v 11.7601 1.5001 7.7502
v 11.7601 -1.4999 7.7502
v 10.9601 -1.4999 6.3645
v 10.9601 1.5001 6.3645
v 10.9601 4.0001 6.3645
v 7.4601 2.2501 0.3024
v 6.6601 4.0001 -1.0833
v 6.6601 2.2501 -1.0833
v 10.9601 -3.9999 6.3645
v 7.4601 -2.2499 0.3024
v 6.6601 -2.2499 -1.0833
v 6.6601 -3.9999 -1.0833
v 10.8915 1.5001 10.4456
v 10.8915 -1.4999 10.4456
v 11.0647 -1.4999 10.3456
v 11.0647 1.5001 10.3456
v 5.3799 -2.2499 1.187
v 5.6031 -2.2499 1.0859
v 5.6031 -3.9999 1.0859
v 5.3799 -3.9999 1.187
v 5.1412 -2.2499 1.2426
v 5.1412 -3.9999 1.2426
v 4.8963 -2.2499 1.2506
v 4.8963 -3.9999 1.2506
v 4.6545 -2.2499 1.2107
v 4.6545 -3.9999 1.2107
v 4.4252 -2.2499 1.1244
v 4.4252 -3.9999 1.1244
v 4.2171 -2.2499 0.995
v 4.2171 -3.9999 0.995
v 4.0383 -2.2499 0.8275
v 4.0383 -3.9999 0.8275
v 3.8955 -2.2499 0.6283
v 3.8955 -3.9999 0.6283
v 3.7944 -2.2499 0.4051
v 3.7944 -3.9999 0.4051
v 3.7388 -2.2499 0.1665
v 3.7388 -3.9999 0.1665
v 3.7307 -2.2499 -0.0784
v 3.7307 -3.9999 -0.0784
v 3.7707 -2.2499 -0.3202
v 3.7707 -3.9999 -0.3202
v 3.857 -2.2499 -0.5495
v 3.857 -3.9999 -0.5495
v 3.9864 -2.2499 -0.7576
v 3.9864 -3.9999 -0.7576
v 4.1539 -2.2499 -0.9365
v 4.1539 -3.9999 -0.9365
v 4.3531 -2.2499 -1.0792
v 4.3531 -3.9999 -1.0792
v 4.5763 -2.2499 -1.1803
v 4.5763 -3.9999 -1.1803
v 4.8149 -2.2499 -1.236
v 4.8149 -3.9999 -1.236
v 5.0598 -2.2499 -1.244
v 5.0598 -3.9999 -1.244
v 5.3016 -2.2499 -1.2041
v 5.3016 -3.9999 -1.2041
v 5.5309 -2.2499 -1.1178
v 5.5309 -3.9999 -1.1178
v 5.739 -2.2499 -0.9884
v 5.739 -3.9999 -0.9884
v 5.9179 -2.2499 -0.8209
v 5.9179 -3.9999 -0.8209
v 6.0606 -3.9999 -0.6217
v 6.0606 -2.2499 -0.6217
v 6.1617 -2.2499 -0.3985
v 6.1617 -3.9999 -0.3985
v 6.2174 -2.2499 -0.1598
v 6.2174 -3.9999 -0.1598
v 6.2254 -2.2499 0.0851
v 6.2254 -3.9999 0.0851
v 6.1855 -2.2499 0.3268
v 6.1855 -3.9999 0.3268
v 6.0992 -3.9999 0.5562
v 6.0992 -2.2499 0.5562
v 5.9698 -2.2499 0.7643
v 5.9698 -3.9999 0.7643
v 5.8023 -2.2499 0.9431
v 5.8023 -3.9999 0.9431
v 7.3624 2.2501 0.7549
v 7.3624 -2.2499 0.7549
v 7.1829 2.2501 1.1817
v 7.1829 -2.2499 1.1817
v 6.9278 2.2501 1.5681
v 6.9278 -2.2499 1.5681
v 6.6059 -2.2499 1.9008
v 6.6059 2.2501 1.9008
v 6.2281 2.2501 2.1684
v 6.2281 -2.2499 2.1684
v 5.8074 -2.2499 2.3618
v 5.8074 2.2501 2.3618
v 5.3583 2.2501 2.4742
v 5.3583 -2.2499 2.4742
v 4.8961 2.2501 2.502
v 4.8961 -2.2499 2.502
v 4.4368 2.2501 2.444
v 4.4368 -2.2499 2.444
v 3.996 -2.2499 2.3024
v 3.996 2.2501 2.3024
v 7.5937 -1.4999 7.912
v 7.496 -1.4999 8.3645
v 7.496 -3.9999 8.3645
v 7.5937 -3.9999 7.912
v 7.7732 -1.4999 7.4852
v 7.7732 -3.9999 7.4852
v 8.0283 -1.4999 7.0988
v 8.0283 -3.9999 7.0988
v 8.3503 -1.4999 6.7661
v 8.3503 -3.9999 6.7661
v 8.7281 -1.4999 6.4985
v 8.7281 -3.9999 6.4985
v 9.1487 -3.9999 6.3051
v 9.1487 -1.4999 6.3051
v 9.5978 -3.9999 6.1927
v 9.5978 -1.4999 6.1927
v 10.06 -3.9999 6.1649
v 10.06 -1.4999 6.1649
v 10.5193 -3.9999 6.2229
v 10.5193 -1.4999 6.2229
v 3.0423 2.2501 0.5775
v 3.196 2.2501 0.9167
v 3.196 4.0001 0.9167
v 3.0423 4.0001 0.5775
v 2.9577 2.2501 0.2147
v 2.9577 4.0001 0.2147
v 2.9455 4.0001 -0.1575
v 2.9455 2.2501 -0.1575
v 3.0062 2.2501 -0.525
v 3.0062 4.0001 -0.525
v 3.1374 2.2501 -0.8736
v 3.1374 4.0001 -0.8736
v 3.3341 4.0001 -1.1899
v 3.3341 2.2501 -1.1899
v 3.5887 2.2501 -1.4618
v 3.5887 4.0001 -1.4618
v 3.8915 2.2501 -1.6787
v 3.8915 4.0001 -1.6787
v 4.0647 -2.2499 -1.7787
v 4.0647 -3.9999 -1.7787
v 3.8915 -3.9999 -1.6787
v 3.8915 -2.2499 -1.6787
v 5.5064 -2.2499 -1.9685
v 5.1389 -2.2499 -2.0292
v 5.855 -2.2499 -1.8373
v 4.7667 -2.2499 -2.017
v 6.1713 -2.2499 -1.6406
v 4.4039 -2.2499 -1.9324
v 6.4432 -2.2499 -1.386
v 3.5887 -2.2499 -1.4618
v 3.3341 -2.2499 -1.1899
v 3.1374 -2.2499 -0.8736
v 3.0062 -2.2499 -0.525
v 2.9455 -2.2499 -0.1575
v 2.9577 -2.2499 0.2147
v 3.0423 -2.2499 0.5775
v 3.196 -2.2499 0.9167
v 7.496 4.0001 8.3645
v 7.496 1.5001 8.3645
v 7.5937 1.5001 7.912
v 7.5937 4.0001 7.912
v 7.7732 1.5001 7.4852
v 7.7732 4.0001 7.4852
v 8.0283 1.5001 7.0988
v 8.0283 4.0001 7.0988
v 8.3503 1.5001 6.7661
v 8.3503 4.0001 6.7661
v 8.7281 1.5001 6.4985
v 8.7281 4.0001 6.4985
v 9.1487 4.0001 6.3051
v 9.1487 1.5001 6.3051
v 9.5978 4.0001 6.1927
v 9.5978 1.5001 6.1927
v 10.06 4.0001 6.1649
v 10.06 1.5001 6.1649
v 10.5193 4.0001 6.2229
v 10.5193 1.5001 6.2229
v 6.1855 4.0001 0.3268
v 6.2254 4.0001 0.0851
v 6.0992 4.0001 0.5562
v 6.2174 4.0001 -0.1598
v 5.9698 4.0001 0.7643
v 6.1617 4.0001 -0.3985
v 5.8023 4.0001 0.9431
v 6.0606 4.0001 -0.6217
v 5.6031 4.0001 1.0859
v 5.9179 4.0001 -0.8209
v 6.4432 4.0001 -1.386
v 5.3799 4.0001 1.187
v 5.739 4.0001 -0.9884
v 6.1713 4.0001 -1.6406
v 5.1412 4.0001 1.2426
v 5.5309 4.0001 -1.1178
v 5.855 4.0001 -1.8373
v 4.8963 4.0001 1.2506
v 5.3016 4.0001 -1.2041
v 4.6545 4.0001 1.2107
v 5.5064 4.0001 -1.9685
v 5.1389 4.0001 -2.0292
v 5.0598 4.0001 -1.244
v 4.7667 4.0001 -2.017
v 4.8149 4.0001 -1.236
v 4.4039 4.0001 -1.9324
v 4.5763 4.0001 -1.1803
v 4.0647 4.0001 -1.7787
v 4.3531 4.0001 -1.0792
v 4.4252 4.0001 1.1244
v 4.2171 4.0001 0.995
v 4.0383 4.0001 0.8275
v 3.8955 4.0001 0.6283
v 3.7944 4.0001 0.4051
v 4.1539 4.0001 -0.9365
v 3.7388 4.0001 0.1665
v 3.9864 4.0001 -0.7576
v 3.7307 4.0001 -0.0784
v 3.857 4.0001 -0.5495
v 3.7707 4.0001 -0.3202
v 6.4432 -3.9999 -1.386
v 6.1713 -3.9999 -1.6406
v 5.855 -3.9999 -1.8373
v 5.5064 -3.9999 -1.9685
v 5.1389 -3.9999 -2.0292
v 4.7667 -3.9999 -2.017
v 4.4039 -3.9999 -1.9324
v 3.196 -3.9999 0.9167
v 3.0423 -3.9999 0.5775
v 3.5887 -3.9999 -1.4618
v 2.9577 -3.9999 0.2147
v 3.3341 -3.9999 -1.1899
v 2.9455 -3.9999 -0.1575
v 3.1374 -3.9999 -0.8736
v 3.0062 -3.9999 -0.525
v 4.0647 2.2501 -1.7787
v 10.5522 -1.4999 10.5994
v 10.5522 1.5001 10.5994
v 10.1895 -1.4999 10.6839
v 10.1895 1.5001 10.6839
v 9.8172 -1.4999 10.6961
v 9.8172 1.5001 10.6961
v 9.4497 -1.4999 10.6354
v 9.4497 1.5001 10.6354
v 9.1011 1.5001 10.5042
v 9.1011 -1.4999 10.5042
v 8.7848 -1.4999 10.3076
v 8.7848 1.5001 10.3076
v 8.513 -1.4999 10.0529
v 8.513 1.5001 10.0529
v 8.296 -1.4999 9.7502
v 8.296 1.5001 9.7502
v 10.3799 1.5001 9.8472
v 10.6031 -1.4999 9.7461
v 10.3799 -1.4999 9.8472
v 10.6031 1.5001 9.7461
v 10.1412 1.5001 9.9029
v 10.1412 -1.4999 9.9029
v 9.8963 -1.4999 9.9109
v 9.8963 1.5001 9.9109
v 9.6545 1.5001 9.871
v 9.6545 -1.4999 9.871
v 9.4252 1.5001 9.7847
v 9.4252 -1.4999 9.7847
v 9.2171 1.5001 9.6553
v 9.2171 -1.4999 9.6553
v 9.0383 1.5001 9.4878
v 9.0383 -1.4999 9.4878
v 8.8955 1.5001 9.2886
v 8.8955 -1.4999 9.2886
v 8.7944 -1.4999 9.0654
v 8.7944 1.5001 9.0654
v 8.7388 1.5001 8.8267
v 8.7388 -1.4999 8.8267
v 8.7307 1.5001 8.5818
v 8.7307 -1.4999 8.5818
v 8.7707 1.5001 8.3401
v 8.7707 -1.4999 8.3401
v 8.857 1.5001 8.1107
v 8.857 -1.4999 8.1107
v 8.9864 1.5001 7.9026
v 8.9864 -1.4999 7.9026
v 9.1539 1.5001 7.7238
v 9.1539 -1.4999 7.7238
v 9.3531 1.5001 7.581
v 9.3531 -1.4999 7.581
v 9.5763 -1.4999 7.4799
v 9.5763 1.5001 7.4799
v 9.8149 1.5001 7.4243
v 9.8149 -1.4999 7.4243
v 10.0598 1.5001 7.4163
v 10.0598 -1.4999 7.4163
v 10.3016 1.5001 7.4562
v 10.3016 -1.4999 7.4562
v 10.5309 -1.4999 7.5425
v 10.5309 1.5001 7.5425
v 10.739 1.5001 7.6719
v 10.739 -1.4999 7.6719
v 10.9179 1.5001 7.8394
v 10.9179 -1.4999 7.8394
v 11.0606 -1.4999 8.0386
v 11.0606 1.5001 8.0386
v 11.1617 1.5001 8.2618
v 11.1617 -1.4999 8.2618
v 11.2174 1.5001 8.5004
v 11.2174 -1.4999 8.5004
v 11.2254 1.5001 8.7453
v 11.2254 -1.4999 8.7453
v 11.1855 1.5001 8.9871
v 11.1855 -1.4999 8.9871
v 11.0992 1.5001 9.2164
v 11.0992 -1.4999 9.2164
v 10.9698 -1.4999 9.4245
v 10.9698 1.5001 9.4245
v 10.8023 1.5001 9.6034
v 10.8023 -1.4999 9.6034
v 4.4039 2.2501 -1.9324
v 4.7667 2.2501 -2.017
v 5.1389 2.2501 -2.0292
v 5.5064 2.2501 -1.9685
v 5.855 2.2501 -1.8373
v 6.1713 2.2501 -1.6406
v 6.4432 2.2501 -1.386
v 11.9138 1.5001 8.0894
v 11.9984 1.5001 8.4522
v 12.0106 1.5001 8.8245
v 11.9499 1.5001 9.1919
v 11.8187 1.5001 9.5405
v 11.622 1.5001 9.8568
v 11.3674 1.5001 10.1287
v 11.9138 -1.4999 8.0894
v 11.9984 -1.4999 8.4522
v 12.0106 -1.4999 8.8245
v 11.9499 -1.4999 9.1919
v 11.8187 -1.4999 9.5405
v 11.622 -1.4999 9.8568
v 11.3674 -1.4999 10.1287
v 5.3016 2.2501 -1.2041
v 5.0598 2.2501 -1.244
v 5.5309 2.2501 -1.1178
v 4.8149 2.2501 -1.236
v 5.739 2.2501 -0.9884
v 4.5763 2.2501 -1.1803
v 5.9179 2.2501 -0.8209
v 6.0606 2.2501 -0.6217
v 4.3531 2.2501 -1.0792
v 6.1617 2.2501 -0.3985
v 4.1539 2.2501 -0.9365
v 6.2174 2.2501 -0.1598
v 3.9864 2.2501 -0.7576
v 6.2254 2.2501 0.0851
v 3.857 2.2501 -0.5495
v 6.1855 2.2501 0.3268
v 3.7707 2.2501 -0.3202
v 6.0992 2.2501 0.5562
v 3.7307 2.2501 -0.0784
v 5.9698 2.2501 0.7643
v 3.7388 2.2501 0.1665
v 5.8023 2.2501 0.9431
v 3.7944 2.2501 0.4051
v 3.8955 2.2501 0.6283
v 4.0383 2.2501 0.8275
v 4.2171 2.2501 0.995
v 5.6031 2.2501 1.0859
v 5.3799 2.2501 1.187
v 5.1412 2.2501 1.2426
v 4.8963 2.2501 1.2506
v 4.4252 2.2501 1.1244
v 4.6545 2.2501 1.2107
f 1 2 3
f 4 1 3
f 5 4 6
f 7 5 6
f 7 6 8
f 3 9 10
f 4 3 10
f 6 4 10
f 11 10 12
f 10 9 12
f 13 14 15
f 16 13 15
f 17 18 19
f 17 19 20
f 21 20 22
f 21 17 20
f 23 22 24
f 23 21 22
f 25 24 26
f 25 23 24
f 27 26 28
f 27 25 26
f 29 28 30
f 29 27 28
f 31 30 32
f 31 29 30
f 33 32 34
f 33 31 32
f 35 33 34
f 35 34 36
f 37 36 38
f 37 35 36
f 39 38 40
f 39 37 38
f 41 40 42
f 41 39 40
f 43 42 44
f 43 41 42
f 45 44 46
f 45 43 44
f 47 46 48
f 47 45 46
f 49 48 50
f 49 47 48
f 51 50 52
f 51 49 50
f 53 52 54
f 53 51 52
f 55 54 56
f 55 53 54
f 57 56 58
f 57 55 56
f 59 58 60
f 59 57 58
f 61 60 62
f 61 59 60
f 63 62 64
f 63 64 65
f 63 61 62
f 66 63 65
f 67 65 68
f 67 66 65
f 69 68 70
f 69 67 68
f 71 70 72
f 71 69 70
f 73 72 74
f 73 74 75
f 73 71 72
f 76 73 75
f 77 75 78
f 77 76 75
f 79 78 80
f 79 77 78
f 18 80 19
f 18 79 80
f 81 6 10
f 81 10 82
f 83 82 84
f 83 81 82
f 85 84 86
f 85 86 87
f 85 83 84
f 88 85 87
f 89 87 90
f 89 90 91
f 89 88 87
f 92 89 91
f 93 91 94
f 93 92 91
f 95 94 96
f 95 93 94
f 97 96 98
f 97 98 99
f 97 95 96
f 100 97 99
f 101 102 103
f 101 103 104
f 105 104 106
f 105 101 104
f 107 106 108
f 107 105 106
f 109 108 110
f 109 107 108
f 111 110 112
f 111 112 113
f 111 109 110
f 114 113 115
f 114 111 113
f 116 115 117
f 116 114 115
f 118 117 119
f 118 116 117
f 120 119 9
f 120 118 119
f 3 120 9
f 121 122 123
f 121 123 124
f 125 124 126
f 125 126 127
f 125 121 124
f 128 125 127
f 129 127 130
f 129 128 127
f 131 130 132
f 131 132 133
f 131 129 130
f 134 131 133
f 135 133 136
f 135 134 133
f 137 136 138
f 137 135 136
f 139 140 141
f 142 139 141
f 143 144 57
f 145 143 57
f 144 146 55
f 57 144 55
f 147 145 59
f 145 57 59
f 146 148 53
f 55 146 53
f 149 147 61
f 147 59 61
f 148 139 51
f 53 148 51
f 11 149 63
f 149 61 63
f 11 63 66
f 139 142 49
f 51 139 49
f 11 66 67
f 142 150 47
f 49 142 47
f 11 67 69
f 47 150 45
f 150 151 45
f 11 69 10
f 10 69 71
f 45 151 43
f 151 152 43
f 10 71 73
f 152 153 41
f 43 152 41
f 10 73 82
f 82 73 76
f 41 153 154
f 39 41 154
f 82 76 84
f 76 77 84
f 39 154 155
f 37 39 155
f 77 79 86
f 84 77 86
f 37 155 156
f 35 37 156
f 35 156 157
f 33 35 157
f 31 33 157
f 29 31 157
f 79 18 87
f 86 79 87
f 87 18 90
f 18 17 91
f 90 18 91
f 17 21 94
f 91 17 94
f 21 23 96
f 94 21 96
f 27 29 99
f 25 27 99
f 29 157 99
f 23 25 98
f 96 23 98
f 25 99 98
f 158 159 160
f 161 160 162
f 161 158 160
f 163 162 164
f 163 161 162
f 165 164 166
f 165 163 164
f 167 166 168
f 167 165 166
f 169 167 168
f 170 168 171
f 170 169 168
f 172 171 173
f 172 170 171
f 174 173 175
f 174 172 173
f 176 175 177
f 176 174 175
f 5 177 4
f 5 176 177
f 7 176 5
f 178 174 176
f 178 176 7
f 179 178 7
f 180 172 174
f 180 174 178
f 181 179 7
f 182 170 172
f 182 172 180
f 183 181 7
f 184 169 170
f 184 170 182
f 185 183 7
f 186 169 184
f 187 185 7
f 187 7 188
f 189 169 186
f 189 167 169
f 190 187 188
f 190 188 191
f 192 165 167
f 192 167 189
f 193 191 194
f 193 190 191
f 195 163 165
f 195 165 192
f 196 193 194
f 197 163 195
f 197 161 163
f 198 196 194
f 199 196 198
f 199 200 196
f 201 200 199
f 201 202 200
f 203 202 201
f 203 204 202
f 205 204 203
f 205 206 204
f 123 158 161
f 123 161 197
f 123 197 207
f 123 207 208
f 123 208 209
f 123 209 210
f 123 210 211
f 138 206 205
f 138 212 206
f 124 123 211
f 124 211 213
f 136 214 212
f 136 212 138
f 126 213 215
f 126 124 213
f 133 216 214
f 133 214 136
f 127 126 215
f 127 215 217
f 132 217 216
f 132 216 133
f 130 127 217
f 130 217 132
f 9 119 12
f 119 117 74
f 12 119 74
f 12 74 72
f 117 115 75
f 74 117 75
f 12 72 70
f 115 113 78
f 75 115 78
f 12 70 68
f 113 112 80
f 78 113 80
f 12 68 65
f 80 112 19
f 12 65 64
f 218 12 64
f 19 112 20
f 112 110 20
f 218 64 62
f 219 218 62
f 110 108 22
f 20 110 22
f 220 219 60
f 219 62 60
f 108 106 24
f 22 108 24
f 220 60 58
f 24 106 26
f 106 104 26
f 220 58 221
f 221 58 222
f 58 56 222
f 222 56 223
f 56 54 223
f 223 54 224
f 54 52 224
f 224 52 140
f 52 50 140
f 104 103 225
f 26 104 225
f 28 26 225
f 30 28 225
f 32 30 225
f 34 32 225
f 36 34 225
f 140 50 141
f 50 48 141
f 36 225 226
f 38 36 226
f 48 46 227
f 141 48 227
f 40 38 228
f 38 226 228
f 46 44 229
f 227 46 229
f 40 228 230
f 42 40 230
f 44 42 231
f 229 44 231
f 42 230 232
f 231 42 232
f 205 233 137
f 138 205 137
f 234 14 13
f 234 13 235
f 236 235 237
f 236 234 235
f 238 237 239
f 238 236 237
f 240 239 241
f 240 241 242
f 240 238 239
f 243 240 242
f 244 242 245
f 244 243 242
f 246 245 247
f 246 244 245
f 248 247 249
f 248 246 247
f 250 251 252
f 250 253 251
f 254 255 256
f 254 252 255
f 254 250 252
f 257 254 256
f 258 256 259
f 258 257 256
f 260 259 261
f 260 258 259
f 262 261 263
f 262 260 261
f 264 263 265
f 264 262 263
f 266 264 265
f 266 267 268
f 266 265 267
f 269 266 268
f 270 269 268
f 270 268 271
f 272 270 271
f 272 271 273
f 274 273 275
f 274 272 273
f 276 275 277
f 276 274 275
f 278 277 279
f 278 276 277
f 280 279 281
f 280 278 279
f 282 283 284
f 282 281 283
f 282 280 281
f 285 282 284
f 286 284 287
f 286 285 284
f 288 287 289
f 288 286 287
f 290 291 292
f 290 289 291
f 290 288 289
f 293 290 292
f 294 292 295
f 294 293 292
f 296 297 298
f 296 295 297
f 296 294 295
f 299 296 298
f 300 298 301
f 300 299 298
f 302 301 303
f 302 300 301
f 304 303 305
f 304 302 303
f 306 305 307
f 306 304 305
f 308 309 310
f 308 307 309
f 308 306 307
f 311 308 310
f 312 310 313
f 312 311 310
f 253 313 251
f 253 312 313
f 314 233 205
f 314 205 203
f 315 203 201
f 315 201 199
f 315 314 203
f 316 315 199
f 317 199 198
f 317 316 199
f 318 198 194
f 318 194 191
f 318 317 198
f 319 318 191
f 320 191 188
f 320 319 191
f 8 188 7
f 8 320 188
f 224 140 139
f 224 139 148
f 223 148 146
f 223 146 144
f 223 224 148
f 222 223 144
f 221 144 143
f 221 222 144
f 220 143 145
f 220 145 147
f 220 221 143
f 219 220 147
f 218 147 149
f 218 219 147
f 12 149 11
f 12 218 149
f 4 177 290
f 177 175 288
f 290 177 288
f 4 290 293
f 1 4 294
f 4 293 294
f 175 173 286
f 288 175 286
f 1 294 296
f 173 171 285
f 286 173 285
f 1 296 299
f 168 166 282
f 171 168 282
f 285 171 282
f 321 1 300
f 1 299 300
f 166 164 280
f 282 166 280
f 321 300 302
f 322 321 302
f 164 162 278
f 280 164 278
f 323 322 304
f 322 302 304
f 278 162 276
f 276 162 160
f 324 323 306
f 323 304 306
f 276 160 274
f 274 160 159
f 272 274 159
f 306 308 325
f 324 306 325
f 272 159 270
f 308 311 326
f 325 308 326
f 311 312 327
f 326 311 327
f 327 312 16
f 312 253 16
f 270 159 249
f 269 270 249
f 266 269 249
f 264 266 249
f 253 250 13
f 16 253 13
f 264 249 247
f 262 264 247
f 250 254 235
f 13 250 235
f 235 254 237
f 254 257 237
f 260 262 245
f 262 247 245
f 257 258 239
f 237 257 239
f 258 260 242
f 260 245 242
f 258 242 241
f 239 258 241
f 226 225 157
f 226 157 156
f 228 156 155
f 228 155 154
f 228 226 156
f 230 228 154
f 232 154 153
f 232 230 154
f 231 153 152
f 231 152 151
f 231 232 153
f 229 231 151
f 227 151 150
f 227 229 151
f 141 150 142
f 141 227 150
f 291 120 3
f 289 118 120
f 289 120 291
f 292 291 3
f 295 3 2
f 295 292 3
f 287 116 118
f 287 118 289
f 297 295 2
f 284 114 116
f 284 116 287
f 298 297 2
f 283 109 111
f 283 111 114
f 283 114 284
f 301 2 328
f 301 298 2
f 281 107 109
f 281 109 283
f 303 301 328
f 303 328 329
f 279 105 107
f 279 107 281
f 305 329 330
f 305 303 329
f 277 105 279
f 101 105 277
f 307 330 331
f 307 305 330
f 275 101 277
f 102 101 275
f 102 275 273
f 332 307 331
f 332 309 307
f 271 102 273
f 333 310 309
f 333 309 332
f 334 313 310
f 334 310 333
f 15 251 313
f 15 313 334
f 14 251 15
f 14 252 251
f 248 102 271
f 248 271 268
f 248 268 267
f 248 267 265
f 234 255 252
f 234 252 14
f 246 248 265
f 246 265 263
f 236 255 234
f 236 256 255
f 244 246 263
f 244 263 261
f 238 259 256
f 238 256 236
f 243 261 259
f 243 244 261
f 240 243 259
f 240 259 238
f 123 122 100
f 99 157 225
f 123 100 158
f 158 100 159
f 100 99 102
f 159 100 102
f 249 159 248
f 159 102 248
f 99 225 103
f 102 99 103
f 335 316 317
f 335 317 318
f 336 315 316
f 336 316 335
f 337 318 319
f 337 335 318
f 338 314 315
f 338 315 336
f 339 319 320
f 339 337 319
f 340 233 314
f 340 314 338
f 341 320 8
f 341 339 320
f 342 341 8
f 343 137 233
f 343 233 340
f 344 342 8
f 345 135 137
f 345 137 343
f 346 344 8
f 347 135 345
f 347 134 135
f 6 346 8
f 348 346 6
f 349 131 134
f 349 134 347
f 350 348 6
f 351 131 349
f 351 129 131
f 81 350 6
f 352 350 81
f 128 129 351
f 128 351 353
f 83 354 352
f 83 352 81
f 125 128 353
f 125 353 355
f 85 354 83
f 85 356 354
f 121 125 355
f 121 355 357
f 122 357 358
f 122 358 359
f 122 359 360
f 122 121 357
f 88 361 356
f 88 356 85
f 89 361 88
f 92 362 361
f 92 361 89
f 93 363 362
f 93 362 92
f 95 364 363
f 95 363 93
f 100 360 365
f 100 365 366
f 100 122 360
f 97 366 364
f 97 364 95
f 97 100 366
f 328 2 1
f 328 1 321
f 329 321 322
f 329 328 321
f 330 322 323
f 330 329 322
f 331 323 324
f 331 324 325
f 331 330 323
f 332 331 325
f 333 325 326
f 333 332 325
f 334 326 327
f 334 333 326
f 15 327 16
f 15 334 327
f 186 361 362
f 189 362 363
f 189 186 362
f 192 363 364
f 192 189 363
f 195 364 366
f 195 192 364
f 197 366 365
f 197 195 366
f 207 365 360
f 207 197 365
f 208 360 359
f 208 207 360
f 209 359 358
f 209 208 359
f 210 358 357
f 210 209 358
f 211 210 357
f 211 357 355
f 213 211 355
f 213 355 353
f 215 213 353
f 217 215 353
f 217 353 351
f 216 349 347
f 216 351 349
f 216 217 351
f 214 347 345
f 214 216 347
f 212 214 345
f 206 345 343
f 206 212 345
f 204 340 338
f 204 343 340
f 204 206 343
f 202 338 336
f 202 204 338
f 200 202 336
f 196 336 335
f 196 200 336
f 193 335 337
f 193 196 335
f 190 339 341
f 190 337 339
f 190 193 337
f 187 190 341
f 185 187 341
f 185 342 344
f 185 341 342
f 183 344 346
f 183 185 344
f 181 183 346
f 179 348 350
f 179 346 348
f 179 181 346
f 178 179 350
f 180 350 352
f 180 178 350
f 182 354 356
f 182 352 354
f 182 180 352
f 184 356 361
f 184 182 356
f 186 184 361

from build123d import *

# Parameters (mm, degrees)
CYLINDER001_R          = 2.5
CYLINDER001_DEPTH      = 2.5
CYLINDER001_ROLL_ANGLE = 90
CYLINDER002_R          = 2.5
CYLINDER002_DEPTH      = 2.5
CYLINDER002_ROLL_ANGLE = 90
CYLINDER_R             = 2.5
CYLINDER_DEPTH         = 4.5
CYLINDER_ROLL_ANGLE    = 90
SKETCH_R               = 1.25
PAD001_DEPTH           = 4
CUT001_PITCH_ANGLE     = -60.000022


with BuildPart() as cylinder001:
    # Cylinder001 → Cylinder001 (new body)
    with BuildSketch(Plane.XY):
        Circle(CYLINDER001_R)
    extrude(amount=CYLINDER001_DEPTH)


with BuildPart() as cylinder001_1:
    # Cylinder001 roll: moved
    add(cylinder001.part.rotate(Axis((0, 0, 0), (1, 0, 0)), CYLINDER001_ROLL_ANGLE))


with BuildPart() as cylinder001_2:
    # Cylinder001 placement: moved
    add(cylinder001_1.part.moved(Location((5, 4, 0))))


with BuildPart() as cylinder002:
    # Cylinder002 → Cylinder002 (new body)
    with BuildSketch(Plane.XY):
        Circle(CYLINDER002_R)
    extrude(amount=CYLINDER002_DEPTH)


with BuildPart() as cylinder002_1:
    # Cylinder002 roll: moved
    add(cylinder002.part.rotate(Axis((0, 0, 0), (1, 0, 0)), CYLINDER002_ROLL_ANGLE))


with BuildPart() as cylinder002_2:
    # Cylinder002 placement: moved
    add(cylinder002_1.part.moved(Location((5, -1.5, 0))))


with BuildPart() as axes_cutout001:
    # Cylinder → Cylinder (new body)
    with BuildSketch(Plane.XY):
        Circle(CYLINDER_R)
    extrude(amount=CYLINDER_DEPTH)


with BuildPart() as axes_cutout001_1:
    # Cylinder roll: moved
    add(axes_cutout001.part.rotate(Axis((0, 0, 0), (1, 0, 0)), CYLINDER_ROLL_ANGLE))


with BuildPart() as axes_cutout001_2:
    # Cylinder placement: moved
    add(axes_cutout001_1.part.moved(Location((-5, 2.25, 0))))

    # Fusion001: union Cylinder001, Cylinder002
    add(cylinder001_2.part)
    add(cylinder002_2.part)


with BuildPart() as track_shape001:
    # Sketch → Pad001 (new body, symmetric)
    with BuildSketch(Plane.XZ):
        with BuildLine():
            Line((-5.1, 2), (5.1, 2))
            ThreePointArc((7, 0.1), (6.443503, 1.443503), (5.1, 2))
            Line((7, 0.1), (7, -0.1))
            ThreePointArc((5.1, -2), (6.443503, -1.443503), (7, -0.1))
            Line((5.1, -2), (-5.1, -2))
            ThreePointArc((-7, -0.1), (-6.443503, -1.443503), (-5.1, -2))
            Line((-7, -0.1), (-7, 0.1))
            ThreePointArc((-5.1, 2), (-6.443503, 1.443503), (-7, 0.1))
        make_face()
        with Locations((-5, 0)):
            Circle(SKETCH_R, mode=Mode.SUBTRACT)
        with Locations((5, 0)):
            Circle(SKETCH_R, mode=Mode.SUBTRACT)
    extrude(amount=PAD001_DEPTH, both=True)

    # Cut001: cut axes-cutout001
    add(axes_cutout001_2.part, mode=Mode.SUBTRACT)


with BuildPart() as track_shape001_1:
    # Cut001 pitch: moved
    add(track_shape001.part.rotate(Axis((0, 0, 0), (0, 1, 0)), CUT001_PITCH_ANGLE))


with BuildPart() as track_shape001_2:
    # Cut001 placement: moved
    add(track_shape001_1.part.moved(Location((7.47807, 0.000117, 4.333453))))


solid = track_shape001_2.part
